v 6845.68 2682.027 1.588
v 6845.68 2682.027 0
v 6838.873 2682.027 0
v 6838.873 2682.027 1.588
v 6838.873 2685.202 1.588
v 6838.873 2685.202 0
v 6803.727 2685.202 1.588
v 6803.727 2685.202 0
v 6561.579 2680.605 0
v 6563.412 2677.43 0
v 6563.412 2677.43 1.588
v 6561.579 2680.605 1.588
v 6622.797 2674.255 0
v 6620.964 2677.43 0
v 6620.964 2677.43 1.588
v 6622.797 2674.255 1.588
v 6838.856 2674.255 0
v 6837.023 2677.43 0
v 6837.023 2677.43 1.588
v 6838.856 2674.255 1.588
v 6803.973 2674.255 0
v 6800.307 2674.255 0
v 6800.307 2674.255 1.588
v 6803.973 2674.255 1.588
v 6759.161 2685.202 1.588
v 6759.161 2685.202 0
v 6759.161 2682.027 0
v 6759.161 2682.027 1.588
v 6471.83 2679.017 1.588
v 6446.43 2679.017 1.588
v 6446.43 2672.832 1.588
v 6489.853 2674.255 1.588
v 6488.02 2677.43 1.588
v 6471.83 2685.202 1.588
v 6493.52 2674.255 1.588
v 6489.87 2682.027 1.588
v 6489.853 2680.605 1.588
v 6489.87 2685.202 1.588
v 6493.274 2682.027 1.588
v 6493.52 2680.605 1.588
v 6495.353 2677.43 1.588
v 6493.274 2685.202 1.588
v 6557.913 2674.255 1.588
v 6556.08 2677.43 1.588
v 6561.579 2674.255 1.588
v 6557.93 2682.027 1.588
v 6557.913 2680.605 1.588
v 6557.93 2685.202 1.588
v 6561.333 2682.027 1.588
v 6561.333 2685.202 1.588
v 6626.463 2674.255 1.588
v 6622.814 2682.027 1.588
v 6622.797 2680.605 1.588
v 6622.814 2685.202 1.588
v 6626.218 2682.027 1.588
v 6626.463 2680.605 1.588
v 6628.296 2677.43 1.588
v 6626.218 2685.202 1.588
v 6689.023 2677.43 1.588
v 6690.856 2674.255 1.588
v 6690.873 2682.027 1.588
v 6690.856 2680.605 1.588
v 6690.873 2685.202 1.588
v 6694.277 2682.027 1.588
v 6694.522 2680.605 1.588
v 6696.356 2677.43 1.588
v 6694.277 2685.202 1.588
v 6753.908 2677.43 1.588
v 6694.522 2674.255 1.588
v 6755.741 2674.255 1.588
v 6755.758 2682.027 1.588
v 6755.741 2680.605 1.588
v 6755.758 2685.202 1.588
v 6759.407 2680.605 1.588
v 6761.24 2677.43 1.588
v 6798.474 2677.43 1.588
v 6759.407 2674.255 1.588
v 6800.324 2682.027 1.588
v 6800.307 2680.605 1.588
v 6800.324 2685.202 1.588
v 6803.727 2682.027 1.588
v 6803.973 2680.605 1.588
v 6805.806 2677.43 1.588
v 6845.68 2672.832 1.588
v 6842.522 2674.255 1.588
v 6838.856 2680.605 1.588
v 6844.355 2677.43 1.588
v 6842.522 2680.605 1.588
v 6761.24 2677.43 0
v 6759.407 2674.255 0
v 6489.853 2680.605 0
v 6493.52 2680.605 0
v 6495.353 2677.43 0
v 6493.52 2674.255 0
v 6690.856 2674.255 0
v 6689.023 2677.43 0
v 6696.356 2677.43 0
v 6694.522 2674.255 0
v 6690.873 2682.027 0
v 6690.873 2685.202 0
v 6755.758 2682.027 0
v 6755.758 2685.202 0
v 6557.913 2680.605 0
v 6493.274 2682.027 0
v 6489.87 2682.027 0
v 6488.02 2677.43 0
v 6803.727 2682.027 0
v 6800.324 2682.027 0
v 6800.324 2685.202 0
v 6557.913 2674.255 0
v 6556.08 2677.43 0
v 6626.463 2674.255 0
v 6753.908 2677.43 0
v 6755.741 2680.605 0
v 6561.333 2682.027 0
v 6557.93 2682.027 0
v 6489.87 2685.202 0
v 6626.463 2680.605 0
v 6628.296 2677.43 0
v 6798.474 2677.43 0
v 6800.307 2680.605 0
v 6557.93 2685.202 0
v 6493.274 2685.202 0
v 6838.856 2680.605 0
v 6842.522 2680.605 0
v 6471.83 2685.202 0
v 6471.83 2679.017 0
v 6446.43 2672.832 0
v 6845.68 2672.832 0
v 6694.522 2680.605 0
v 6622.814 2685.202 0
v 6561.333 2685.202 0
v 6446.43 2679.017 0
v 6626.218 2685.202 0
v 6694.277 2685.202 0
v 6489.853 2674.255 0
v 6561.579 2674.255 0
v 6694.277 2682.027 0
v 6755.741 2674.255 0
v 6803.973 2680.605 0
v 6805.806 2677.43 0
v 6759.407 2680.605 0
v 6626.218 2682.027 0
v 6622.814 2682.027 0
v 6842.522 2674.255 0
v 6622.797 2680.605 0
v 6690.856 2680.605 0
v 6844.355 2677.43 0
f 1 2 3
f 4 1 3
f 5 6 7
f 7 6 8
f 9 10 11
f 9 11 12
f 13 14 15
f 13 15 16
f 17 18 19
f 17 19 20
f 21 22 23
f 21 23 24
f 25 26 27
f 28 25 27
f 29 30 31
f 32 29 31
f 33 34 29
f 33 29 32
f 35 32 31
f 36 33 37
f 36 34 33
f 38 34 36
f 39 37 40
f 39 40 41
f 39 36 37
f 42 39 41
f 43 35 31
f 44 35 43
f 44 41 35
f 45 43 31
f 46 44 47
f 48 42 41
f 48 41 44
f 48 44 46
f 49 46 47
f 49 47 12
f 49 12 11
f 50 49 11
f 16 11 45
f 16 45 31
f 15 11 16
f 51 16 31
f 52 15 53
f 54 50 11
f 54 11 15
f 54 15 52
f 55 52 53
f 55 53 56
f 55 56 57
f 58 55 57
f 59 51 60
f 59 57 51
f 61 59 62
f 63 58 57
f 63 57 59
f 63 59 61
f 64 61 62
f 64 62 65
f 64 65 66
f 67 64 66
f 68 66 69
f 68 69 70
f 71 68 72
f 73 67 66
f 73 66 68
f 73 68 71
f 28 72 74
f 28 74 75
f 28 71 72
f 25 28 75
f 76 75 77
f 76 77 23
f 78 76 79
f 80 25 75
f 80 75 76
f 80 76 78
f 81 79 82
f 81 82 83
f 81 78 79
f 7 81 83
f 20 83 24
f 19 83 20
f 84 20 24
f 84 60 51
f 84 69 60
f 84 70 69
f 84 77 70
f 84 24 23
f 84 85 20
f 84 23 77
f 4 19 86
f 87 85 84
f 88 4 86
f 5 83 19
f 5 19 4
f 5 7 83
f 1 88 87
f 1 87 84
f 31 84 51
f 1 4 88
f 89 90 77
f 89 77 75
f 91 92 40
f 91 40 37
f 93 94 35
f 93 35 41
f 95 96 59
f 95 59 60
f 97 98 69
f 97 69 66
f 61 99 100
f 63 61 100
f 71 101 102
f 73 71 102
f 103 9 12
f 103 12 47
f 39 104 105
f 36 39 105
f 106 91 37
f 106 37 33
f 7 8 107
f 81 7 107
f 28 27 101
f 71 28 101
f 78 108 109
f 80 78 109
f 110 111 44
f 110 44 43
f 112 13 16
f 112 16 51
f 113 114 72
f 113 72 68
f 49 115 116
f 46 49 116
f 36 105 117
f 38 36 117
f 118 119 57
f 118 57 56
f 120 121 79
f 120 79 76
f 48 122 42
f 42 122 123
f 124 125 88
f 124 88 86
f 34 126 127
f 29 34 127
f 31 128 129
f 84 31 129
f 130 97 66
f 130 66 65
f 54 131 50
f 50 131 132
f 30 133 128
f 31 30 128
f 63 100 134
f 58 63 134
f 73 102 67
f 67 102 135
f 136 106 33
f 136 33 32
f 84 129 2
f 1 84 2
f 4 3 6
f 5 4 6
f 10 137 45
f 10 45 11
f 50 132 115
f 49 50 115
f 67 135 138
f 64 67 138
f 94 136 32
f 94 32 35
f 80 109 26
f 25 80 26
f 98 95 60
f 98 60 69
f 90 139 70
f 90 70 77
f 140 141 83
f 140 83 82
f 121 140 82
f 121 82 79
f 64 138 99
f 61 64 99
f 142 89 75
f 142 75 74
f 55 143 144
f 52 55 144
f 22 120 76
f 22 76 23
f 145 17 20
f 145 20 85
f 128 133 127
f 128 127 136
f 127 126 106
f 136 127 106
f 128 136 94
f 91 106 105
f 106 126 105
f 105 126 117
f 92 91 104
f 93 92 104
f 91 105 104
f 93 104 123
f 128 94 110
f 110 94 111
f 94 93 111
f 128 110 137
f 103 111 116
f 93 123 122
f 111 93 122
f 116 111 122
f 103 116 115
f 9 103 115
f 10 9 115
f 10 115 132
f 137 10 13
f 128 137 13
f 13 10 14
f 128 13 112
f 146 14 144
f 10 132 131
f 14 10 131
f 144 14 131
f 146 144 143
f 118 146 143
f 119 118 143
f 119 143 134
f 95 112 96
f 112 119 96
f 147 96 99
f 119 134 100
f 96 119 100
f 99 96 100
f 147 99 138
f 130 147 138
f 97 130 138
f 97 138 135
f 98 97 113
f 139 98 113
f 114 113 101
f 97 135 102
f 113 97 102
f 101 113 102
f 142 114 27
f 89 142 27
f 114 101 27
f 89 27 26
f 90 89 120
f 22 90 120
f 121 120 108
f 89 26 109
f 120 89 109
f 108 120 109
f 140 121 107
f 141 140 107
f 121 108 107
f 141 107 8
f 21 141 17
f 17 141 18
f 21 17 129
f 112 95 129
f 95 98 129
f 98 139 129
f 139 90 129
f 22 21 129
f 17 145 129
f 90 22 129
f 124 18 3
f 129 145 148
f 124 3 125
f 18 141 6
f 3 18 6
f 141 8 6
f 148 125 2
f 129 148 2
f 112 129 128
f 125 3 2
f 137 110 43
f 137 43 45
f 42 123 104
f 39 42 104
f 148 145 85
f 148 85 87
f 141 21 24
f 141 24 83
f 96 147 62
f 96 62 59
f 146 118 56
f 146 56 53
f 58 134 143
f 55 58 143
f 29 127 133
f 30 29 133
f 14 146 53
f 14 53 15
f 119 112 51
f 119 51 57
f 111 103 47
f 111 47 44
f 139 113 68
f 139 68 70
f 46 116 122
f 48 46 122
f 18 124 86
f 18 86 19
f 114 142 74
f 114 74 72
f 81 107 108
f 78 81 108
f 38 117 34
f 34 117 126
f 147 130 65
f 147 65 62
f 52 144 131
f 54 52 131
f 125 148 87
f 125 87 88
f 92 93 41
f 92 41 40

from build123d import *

# Parameters (mm, degrees)
BOSS_EXTRUDE1_DEPTH = 1.5875


with BuildPart() as part:
    # Sketch1 → Boss-Extrude1 (new body)
    with BuildSketch(Plane.XY):
        Polygon((6838.872739, 2682.026941165), (6838.872739, 2685.201941165), (6803.727441916, 2685.201941165), (6803.727441916, 2682.026941165), (6800.323841916, 2682.026941165), (6800.323841916, 2685.201941165), (6759.161189, 2685.201941165), (6759.161189, 2682.026941165), (6755.757589, 2682.026941165), (6755.757589, 2685.201941165), (6694.276889, 2685.201941165), (6694.276889, 2682.026941165), (6690.873289, 2682.026941165), (6690.873289, 2685.201941165), (6626.217589, 2685.201941165), (6626.217589, 2682.026941165), (6622.813989, 2682.026941165), (6622.813989, 2685.201941165), (6561.333289, 2685.201941165), (6561.333289, 2682.026941165), (6557.929689, 2682.026941165), (6557.929689, 2685.201941165), (6493.273989, 2685.201941165), (6493.273989, 2682.026941165), (6489.870389, 2682.026941165), (6489.870389, 2685.201941165), (6471.830039, 2685.201941165), (6471.830039, 2679.017041165), (6446.430039, 2679.017041165), (6446.430039, 2672.832141165), (6845.679939, 2672.832141165), (6845.679939, 2682.026941165), align=None)
        Polygon((6493.519576105, 2674.254541165), (6495.35266321, 2677.429541165), (6493.519576105, 2680.604541165), (6489.853401896, 2680.604541165), (6488.020314791, 2677.429541165), (6489.853401896, 2674.254541165), align=None, mode=Mode.SUBTRACT)
        Polygon((6561.578876105, 2674.254541165), (6563.41196321, 2677.429541165), (6561.578876105, 2680.604541165), (6557.912701896, 2680.604541165), (6556.079614791, 2677.429541165), (6557.912701896, 2674.254541165), align=None, mode=Mode.SUBTRACT)
        Polygon((6626.463176105, 2674.254541165), (6628.29626321, 2677.429541165), (6626.463176105, 2680.604541165), (6622.797001896, 2680.604541165), (6620.963914791, 2677.429541165), (6622.797001896, 2674.254541165), align=None, mode=Mode.SUBTRACT)
        Polygon((6694.522476105, 2674.254541165), (6696.35556321, 2677.429541165), (6694.522476105, 2680.604541165), (6690.856301896, 2680.604541165), (6689.023214791, 2677.429541165), (6690.856301896, 2674.254541165), align=None, mode=Mode.SUBTRACT)
        Polygon((6759.406776105, 2674.254541165), (6761.23986321, 2677.429541165), (6759.406776105, 2680.604541165), (6755.740601896, 2680.604541165), (6753.907514791, 2677.429541165), (6755.740601896, 2674.254541165), align=None, mode=Mode.SUBTRACT)
        Polygon((6803.973029021, 2674.254541165), (6805.806116126, 2677.429541165), (6803.973029021, 2680.604541165), (6800.306854812, 2680.604541165), (6798.473767707, 2677.429541165), (6800.306854812, 2674.254541165), align=None, mode=Mode.SUBTRACT)
        Polygon((6842.521926105, 2674.254541165), (6844.35501321, 2677.429541165), (6842.521926105, 2680.604541165), (6838.855751896, 2680.604541165), (6837.022664791, 2677.429541165), (6838.855751896, 2674.254541165), align=None, mode=Mode.SUBTRACT)
    extrude(amount=BOSS_EXTRUDE1_DEPTH)


solid = part.part
